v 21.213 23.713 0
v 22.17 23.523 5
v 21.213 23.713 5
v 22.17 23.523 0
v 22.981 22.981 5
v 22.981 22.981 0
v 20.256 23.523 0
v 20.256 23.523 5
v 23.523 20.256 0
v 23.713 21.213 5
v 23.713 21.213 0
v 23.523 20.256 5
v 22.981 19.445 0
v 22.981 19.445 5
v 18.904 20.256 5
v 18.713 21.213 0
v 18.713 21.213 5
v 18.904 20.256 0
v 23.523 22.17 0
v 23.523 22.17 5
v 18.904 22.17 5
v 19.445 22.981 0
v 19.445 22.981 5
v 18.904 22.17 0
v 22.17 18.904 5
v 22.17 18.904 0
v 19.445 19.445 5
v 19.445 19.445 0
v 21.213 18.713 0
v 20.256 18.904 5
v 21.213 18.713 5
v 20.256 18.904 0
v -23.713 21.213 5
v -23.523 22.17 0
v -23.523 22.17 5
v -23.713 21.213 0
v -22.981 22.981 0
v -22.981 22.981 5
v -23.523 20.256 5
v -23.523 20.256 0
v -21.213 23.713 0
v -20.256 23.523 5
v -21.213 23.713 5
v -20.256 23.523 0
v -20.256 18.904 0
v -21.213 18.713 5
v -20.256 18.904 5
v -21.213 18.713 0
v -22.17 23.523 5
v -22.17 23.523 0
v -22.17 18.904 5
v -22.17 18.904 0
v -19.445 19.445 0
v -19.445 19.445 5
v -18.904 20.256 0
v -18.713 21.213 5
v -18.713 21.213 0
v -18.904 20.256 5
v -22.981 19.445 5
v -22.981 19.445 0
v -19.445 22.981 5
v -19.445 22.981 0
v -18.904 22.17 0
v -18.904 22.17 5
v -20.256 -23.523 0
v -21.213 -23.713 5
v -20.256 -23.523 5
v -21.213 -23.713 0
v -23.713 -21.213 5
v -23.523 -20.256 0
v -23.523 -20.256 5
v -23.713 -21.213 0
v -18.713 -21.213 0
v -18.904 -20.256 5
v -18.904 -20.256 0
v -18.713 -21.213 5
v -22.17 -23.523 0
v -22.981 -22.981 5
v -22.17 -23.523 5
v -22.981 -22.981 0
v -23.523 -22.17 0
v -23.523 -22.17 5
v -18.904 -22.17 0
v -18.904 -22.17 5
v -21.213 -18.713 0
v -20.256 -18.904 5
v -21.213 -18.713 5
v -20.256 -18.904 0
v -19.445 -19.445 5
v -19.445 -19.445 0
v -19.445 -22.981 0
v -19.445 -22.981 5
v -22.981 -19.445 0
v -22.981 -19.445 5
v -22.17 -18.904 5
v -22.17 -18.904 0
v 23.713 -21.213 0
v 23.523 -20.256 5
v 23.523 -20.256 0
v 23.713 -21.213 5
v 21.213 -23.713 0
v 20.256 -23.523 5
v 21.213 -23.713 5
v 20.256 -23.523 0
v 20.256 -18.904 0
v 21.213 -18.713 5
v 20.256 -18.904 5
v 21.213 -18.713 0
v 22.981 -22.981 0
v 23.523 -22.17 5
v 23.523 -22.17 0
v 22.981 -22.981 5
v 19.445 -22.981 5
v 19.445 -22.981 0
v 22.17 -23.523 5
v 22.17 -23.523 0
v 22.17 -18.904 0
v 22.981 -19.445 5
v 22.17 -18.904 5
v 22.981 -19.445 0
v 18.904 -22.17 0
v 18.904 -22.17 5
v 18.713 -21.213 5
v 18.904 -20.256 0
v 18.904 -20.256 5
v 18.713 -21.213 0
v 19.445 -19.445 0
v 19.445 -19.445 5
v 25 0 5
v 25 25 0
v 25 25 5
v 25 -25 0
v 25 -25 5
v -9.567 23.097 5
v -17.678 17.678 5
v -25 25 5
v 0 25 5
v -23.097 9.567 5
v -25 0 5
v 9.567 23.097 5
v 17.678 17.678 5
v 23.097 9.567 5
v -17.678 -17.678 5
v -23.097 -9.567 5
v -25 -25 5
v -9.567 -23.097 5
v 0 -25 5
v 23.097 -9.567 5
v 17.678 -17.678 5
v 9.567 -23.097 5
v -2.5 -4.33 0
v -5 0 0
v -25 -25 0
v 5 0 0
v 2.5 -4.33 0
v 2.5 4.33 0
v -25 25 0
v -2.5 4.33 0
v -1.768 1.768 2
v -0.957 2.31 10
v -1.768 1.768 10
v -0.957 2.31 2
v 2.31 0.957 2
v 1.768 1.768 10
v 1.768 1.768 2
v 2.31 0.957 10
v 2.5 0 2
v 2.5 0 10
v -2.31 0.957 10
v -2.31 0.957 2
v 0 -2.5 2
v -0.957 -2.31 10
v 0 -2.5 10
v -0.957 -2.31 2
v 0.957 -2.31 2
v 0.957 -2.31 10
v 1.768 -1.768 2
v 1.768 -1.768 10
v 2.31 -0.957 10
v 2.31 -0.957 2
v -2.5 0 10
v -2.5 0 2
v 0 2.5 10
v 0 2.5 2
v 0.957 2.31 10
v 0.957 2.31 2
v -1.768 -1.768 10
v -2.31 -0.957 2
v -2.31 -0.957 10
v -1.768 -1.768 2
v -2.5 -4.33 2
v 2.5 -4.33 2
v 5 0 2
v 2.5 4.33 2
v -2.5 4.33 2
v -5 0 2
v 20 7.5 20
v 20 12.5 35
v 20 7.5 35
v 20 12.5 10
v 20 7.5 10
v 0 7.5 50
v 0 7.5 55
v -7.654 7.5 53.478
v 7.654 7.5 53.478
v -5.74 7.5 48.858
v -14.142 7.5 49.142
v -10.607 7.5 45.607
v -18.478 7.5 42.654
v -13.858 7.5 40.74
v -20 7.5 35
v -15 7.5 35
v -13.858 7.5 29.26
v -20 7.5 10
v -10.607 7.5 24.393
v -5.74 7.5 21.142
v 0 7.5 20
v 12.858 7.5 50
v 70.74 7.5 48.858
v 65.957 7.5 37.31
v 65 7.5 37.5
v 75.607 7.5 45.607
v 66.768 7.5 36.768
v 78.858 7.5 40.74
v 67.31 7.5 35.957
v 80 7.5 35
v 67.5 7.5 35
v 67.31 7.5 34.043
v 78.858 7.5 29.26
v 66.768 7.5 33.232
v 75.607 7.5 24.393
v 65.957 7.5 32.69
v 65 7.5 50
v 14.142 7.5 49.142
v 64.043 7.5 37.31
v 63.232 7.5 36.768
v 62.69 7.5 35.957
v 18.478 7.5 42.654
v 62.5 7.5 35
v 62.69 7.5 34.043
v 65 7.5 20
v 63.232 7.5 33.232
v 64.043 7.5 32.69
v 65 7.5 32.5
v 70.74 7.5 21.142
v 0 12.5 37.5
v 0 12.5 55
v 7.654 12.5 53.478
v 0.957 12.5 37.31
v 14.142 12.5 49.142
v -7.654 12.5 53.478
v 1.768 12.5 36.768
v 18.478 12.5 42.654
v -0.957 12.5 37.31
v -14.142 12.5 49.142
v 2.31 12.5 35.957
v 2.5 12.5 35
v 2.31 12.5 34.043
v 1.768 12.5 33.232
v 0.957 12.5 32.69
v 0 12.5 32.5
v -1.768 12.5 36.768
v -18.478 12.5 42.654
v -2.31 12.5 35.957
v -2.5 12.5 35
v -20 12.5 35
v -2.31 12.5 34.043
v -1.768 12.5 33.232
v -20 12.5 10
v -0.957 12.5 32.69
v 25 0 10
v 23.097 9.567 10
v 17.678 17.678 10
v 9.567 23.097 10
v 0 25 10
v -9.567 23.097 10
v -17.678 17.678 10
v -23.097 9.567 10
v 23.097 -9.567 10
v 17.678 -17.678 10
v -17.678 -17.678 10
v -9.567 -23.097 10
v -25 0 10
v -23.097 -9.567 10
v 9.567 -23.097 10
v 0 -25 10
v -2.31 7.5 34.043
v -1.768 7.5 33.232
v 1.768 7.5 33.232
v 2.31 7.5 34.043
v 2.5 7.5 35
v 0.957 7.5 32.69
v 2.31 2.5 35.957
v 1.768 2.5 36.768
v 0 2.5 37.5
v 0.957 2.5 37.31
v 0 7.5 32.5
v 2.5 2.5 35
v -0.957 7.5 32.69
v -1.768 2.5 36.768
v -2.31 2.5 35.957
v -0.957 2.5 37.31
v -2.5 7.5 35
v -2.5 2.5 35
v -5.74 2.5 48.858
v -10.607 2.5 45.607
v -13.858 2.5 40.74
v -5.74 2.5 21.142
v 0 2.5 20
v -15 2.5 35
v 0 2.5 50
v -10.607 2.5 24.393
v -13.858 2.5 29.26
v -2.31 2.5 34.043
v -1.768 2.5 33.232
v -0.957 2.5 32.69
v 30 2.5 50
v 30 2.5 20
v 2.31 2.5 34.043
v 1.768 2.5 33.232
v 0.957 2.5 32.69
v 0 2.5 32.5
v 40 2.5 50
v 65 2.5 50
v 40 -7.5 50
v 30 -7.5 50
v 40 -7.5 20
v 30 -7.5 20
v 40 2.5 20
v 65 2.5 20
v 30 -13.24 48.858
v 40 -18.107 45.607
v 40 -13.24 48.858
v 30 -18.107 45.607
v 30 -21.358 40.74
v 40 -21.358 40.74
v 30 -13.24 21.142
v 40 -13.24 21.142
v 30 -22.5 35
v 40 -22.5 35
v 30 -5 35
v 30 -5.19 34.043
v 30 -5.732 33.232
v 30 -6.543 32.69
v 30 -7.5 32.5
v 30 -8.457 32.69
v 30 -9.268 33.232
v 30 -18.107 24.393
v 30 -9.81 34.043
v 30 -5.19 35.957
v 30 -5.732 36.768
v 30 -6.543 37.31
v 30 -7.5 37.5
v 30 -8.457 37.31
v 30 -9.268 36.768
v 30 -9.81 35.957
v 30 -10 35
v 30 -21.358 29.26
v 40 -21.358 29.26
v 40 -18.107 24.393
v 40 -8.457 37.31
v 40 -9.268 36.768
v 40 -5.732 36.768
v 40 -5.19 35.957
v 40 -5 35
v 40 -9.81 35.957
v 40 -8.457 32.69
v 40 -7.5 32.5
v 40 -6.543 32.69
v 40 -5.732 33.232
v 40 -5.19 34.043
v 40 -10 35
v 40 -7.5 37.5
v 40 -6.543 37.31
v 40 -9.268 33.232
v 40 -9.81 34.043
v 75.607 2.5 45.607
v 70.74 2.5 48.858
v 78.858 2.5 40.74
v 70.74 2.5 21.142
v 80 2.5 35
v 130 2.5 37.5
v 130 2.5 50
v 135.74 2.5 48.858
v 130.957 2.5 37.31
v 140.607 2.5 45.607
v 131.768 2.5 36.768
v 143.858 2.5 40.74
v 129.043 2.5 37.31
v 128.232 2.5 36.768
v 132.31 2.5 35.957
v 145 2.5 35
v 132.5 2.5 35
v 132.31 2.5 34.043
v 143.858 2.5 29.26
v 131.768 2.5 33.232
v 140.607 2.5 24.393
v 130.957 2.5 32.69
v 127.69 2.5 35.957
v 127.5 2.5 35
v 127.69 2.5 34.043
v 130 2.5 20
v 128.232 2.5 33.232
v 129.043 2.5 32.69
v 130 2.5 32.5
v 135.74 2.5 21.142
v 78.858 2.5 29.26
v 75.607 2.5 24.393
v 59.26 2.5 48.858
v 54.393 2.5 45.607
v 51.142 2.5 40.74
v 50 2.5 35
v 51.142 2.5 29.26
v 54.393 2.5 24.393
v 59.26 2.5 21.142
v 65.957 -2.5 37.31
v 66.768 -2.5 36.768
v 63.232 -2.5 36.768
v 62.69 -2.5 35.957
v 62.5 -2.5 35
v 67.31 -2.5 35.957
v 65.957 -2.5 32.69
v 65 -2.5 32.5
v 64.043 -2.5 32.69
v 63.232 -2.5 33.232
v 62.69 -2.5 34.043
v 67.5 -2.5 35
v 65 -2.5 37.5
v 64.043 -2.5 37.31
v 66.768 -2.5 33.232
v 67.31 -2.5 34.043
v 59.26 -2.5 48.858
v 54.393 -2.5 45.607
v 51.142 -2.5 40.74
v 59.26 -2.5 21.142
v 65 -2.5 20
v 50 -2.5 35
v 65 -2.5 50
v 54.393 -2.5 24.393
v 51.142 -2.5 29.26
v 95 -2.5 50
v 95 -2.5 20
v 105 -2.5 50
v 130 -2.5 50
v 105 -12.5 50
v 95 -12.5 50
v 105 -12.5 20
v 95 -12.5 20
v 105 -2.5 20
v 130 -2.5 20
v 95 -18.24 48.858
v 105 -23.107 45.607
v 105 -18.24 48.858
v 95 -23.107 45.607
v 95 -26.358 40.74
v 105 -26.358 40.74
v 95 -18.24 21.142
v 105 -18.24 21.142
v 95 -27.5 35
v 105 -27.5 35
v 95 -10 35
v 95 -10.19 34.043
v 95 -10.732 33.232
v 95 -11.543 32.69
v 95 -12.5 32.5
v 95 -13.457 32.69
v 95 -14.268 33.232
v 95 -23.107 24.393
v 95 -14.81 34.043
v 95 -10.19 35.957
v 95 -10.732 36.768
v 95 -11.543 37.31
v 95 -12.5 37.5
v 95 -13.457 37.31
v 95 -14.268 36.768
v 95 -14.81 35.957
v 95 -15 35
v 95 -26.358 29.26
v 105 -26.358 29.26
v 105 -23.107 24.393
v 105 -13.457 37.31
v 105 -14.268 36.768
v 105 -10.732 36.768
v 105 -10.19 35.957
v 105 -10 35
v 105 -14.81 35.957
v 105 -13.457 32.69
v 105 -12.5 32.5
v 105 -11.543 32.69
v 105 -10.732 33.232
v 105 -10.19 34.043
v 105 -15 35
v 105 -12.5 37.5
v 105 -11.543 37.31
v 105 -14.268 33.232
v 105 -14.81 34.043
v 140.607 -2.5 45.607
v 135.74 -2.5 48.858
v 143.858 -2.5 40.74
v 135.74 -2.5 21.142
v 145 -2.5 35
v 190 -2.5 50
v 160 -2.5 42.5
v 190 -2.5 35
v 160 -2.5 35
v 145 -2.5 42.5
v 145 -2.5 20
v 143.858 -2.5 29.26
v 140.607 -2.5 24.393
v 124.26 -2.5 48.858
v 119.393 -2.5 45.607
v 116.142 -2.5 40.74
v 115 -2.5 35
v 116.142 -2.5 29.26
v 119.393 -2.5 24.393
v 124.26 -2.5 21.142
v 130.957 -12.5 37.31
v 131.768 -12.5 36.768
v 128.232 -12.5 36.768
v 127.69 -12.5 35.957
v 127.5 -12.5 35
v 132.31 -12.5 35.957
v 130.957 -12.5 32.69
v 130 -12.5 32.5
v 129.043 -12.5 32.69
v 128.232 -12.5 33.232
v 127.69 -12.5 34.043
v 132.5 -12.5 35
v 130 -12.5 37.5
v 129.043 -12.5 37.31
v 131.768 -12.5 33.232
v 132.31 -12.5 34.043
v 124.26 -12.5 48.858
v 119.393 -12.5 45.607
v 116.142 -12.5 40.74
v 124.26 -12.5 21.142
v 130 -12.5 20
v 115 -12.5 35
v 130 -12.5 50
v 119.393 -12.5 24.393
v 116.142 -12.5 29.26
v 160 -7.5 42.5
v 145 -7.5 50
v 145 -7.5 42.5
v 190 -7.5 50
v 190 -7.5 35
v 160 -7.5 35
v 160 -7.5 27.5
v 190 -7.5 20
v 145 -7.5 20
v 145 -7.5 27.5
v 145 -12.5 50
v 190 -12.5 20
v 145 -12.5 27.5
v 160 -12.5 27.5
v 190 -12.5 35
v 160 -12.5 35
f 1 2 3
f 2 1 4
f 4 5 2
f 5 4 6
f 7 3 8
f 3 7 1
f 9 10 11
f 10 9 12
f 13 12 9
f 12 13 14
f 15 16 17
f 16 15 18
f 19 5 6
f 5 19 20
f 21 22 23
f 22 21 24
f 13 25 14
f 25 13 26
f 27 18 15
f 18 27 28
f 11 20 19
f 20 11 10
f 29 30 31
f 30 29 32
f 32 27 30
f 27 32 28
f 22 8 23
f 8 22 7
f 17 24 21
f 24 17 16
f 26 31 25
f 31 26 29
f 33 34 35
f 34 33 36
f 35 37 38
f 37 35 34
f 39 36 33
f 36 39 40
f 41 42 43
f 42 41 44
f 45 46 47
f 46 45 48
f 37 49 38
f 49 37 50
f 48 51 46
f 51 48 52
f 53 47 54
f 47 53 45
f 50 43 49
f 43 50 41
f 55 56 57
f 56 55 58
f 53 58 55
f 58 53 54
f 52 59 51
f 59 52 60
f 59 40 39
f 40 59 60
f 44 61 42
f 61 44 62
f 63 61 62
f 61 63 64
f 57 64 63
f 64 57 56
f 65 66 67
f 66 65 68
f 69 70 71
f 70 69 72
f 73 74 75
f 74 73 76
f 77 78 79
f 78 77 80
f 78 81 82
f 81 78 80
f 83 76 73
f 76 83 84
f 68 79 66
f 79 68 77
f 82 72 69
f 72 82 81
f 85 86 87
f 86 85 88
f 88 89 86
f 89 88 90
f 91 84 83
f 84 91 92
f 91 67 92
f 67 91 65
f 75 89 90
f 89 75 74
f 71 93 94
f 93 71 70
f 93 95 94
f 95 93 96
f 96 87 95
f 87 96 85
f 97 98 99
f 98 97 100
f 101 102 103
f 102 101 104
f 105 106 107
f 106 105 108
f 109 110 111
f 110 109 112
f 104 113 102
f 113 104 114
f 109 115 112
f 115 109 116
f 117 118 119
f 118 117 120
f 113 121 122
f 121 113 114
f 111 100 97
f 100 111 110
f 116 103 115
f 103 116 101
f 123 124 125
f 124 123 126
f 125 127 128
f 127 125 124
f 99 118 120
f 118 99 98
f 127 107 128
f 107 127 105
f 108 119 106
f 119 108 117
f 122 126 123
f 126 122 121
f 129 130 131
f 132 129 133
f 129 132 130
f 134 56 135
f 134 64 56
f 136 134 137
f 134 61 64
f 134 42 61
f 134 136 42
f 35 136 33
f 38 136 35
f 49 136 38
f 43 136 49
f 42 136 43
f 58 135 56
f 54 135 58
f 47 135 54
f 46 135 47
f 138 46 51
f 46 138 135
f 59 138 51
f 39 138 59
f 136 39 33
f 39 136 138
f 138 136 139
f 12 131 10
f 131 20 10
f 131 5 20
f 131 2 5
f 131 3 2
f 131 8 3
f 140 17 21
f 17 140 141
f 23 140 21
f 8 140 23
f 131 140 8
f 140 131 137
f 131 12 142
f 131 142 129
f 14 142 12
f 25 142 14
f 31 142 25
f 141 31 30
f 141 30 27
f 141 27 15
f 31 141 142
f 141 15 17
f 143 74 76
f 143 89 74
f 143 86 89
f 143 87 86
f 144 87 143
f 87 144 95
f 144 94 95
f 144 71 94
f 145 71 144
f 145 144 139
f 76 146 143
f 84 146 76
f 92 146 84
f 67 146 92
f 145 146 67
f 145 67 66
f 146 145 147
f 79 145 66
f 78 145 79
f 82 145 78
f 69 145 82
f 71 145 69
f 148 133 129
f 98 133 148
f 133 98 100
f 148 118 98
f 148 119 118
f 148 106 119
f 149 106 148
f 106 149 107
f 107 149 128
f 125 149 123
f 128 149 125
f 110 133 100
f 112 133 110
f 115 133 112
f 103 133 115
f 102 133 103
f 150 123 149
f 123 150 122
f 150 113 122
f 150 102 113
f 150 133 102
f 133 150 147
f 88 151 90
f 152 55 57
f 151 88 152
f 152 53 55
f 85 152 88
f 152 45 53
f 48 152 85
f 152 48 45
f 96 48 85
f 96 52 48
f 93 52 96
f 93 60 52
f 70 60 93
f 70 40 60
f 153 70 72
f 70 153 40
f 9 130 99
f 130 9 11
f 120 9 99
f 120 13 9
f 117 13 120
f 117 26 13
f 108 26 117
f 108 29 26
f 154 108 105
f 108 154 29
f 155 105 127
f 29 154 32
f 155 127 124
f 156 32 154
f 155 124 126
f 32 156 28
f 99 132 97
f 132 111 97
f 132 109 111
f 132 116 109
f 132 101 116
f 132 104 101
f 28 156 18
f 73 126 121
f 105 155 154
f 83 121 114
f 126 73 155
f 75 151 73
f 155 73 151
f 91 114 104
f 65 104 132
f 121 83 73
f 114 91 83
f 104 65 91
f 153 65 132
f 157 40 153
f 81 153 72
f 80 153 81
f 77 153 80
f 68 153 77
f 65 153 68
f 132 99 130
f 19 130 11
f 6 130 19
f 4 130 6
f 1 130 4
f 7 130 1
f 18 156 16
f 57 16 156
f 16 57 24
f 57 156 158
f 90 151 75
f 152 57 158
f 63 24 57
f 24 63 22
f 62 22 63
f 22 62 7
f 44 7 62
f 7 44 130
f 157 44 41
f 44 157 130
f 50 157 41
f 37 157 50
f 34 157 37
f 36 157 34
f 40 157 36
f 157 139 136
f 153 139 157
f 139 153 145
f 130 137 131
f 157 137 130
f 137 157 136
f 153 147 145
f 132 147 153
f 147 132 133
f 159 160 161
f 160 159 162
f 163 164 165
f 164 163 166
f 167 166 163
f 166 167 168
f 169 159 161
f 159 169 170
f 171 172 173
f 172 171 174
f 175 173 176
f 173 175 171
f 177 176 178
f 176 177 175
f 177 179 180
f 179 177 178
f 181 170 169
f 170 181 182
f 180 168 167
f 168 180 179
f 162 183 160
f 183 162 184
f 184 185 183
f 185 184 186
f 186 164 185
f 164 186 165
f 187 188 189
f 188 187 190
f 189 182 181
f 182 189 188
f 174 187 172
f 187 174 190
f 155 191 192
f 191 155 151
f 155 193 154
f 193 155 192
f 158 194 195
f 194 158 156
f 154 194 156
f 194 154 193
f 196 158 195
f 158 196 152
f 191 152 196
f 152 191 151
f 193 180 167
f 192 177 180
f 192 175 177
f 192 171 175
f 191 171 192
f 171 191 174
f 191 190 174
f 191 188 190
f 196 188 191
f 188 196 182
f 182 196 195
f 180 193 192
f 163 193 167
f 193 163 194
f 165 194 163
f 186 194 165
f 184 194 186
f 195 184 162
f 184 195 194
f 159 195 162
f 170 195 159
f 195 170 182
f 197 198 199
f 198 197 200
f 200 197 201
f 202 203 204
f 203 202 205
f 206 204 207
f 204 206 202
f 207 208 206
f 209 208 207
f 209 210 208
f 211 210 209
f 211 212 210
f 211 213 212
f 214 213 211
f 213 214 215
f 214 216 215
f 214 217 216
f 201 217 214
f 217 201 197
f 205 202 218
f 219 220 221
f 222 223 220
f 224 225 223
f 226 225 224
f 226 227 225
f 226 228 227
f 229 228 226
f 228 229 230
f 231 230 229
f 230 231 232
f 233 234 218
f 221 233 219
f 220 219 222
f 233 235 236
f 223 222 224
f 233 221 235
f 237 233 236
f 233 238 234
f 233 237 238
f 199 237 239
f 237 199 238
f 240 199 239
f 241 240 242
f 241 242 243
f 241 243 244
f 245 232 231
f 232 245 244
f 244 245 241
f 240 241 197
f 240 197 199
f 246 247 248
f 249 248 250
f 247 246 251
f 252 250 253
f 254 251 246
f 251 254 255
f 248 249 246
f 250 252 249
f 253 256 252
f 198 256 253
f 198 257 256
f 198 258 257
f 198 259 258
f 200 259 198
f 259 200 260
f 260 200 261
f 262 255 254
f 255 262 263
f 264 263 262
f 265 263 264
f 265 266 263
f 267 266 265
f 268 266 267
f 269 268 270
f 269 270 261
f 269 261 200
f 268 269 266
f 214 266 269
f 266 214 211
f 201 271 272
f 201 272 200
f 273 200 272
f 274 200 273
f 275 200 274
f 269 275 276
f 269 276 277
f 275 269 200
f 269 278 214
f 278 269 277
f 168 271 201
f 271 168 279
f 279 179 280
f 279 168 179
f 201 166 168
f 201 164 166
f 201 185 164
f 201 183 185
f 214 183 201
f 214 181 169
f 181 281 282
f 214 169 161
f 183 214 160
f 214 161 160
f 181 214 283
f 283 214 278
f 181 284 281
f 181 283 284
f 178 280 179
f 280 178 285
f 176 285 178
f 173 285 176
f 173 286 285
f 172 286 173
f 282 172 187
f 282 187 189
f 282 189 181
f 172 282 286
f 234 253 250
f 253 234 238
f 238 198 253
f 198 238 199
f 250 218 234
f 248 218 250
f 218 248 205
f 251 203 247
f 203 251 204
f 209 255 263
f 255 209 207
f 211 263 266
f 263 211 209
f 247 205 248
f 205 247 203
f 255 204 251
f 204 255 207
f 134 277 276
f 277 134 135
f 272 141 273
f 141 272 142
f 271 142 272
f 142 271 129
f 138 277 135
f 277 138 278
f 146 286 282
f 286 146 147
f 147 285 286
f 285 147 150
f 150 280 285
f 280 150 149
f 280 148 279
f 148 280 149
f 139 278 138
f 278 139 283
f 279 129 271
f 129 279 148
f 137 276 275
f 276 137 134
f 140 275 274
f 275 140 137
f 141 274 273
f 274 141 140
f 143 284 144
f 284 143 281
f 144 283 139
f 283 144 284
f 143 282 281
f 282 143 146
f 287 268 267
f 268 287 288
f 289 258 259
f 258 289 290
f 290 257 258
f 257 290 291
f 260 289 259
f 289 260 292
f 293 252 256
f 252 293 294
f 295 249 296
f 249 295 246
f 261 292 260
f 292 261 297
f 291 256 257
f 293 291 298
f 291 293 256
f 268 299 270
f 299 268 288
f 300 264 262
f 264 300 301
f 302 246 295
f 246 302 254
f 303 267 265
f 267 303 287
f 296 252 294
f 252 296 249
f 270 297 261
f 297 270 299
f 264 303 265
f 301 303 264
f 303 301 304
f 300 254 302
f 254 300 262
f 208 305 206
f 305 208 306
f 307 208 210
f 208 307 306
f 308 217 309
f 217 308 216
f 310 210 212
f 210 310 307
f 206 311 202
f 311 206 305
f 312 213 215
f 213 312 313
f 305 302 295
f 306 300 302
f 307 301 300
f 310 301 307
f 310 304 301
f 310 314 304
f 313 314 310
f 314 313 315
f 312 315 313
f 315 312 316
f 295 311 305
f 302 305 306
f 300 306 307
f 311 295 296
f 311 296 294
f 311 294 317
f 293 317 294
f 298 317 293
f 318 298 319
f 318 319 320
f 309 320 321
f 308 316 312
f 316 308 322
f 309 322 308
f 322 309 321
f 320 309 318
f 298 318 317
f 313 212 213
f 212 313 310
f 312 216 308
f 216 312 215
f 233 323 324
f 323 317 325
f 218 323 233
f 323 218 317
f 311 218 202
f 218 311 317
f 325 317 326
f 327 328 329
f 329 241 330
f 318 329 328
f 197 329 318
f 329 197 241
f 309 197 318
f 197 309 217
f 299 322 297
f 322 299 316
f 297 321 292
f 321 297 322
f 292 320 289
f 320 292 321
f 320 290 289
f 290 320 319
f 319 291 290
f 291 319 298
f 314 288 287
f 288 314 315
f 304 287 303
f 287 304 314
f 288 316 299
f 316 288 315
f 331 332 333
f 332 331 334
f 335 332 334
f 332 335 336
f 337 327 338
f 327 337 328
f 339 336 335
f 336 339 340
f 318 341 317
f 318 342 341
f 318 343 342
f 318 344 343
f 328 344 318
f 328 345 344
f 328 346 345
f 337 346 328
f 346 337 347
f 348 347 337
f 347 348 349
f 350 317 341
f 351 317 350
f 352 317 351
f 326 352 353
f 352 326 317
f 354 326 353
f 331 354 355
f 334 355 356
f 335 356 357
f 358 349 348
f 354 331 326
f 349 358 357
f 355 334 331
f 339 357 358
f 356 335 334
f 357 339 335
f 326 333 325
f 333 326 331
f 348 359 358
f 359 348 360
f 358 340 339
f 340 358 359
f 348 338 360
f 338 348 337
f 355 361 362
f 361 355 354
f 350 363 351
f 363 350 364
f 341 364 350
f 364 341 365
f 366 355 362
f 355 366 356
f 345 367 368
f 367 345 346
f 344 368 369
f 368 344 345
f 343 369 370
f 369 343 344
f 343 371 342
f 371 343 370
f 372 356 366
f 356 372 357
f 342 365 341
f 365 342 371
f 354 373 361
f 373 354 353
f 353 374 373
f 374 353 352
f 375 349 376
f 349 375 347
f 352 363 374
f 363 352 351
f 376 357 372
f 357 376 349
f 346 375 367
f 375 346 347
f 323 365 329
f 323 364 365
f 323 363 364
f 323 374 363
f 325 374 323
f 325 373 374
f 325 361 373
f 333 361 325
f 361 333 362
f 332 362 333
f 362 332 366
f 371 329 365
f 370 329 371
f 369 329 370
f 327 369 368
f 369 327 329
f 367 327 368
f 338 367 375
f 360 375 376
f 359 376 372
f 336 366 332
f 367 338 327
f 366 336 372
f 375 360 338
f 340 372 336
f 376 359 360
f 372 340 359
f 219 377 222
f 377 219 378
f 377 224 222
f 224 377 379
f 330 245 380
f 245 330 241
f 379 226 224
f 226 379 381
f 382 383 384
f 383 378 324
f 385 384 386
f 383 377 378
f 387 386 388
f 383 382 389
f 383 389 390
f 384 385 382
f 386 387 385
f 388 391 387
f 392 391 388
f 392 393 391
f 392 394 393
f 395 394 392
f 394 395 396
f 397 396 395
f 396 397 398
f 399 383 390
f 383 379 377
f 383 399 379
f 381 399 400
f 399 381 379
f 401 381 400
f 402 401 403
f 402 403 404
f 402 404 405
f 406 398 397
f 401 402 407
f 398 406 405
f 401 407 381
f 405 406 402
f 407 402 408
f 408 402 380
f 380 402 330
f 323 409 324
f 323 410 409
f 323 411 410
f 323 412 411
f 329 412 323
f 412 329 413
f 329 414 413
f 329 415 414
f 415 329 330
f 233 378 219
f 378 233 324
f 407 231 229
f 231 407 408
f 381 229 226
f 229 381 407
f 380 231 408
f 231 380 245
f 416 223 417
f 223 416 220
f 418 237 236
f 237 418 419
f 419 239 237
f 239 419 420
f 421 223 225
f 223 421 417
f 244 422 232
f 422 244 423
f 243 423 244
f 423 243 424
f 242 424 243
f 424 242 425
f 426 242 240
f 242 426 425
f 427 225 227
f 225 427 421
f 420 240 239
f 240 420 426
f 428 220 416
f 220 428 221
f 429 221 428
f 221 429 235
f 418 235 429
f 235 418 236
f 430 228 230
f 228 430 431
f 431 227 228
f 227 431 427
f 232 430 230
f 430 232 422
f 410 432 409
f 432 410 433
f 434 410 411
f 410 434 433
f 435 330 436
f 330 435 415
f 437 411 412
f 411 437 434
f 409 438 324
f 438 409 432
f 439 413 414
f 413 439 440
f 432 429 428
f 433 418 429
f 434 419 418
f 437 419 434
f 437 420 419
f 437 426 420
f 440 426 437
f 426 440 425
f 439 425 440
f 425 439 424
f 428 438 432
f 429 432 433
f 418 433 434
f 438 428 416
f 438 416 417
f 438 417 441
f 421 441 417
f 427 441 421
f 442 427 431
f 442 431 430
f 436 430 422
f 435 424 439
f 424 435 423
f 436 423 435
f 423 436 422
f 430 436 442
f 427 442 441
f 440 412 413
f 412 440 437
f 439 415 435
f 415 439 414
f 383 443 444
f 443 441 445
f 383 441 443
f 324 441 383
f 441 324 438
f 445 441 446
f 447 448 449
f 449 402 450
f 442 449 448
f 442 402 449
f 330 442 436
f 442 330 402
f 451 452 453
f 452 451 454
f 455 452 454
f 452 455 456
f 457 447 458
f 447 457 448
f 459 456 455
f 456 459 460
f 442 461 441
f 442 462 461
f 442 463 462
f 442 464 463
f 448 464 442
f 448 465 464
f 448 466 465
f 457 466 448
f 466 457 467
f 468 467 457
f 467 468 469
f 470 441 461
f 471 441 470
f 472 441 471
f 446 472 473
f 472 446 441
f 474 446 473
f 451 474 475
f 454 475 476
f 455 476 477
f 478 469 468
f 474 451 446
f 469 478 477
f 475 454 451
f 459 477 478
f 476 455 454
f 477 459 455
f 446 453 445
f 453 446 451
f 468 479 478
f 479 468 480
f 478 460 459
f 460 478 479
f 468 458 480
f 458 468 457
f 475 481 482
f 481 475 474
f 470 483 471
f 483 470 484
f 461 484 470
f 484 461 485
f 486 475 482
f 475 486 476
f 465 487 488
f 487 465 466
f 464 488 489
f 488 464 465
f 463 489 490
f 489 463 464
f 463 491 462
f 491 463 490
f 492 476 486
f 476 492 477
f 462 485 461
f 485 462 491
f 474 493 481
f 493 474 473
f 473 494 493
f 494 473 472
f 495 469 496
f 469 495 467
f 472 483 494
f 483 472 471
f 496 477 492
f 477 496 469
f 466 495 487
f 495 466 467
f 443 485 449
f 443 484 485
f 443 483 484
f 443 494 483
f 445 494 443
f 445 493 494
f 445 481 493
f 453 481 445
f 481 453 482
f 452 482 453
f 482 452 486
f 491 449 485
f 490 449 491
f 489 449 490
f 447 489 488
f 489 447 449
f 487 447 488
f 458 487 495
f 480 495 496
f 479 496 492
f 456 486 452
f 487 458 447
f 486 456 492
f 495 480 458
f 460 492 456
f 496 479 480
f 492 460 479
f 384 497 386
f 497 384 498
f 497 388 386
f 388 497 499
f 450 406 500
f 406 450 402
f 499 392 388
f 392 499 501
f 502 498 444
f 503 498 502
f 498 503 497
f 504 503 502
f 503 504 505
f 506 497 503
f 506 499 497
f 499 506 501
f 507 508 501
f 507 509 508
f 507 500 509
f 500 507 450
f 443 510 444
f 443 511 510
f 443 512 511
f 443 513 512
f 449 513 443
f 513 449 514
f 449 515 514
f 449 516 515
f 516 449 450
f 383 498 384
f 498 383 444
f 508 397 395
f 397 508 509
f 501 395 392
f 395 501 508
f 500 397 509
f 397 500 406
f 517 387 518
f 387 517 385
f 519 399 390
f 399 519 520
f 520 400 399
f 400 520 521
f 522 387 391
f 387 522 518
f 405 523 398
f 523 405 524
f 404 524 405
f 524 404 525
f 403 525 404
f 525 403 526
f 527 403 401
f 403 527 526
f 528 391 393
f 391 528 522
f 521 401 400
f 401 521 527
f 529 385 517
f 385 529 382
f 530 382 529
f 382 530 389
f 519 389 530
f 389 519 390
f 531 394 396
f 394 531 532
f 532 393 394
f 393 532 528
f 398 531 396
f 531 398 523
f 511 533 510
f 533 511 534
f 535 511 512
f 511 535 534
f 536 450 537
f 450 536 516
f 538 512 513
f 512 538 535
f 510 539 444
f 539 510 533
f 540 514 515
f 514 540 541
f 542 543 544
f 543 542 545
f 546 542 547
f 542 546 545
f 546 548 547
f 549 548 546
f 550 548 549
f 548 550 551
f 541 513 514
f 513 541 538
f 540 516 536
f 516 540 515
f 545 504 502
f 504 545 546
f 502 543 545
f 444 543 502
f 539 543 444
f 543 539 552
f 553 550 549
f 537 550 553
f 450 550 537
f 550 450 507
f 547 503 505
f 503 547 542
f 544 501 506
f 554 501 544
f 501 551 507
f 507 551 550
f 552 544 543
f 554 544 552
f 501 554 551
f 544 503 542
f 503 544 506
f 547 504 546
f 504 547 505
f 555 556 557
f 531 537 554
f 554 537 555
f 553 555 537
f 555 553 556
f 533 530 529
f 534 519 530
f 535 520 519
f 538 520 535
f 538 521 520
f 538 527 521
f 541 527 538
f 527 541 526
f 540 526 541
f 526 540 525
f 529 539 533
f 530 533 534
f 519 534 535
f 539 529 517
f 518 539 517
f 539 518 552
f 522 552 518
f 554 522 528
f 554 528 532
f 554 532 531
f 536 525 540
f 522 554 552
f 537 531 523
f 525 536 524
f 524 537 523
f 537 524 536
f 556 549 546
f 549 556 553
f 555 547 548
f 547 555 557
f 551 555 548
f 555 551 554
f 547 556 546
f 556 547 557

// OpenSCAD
//6 DOF robot generator

//General parameters
$fn=16;
del=1; //small delta
hole=5; //hole diameter in mm
nut_d=10; //corner to corner nut diameter
nut_h=2; //nut thickness
thick=5; //part thickness

//Base params
base_width=50;
shoulder_yaw=0; //Shoulder left to right rotation. Zero is toward the front

//Shoulder params
riser_offset=-10;
riser_space=5;
riser_diam=40;
arm_pitch=180*$t; //arm up down rotation. Zero is toward the front

//Arm params
arm_width=30;
arm_length=30;
elbow_roll=90*$t;

forearm_pitch=90*$t;
wrist_roll=90*$t;
hand_pitch=90*$t;
finger_pitch=90*$t;


//Creating the robot arm
base(base_width,thick,1);

//Tests
//bracket(20,20,5,20,20,5);
//bracket(30,10,5,20,30,5);
//make_tombstone(30,10,5);
//make_tombstone(20,30,5);
//arm(30,100,1);

//Base
module base(base_w,base_h,child=0){
    difference(){
        translate([-base_w/2,-base_w/2,0]) cube([base_w,base_w,base_h]);{
            make_hole(hole,base_h);
            cylinder(nut_h,nut_d/2,nut_d/2,$fn=6);
            for(phi=[45,135,225,315])
                rotate([0,0,phi])
                translate([base_w/2*1.2,0,0])
                make_hole(hole,base_h);
        }
    }
    if(child){
        translate([0,0,thick]) color("blue")
        rotate([0,0,shoulder_yaw])
        shoulder(base_width,thick,riser_offset,riser_space,riser_diam,1);
    }
}

//Shoulder
module shoulder(base_w,base_h,riser_offset,riser_space,riser_diam,child=0)
{
    difference(){
        union(){
            cylinder(base_h,base_w/2,base_w/2);
            translate([0,0,base_h])
            rotate([90,0,0])
            translate([-riser_diam/2,0,-base_h/2+riser_offset]){
                cube([riser_diam,riser_diam/2+riser_space,base_h]);
                translate([riser_diam/2,riser_diam/2+riser_space,0])
                cylinder(base_h,riser_diam/2,riser_diam/2);
            }
        }
        union(){
            make_hole(hole,base_h);
            translate([0,0,base_h+riser_space+riser_diam/2]){
                rotate([90,0,0])
                make_hole(hole,riser_offset+base_h/2);
                rotate([-90,0,0])
                make_hole(hole,-riser_offset+base_h/2);
            }
        }
    }
    if(child){
        translate([0,-riser_offset-thick/2,thick+riser_space+riser_diam/2])
        rotate([90,0,0])
        rotate([0,0,arm_pitch])
        arm(arm_width,arm_length,1);
    }
}

module arm(width,length,child=0){
    bracket(width,length,thick,width,width/2,thick);
    if(child){
        translate([length+thick,0,width/2])
        rotate([0,90,0])
        rotate([0,0,elbow_roll])
        //cylinder(10,0,5);
        elbow(width,length,1);
    }
}

module elbow(width,length,child=0){
    bracket(width,width/2-thick,thick,width,length,thick);
    if(child){
        translate([width/2-thick,0,length])
        rotate([0,-90,0])
        rotate([0,0,forearm_pitch])
        //cylinder(10,0,5);
        forearm(width,length,1);
    }
}

module forearm(width,length,child=0){
    bracket(width,length,thick,width,width/2,thick);
    if(child){
        translate([length+thick,0,width/2])
        rotate([0,90,0])
        rotate([0,0,wrist_roll])
        //cylinder(10,0,5);
        wrist(width,length,1);
    }
}

module wrist(width,length,child=0){
    bracket(width,width/2-thick,thick,width,length,thick);
    if(child){
        translate([width/2-thick,0,length])
        rotate([0,-90,0]){
            //cylinder(10,0,5);
            rotate([0,0,hand_pitch])
            hand(width,width*2,1);
            translate([0,0,thick*2])
            rotate([180,0,0])
            rotate([0,0,finger_pitch])
            hand(width,width*2,1);
        }
    }
}

module hand(width,length,child=0){
    difference(){
        make_tombstone(width,length,thick);
        union(){
            translate([width/2,-width/2-1,-1])
            cube([width/2,width*0.75+1,thick+2]);
            translate([width-1,-width/2-1,-1])
            cube([width+2,width*0.5+1,thick+2]);
        }
    }
}
module make_hole(w,h){
    translate([0,0,-del])
    cylinder(h+2*del,w/2,w/2);
}

module bracket(base_w,base_l,base_t,riser_w,riser_l,riser_t){
    make_tombstone(base_w,base_l+riser_t,base_t);
    translate([base_l,0,riser_l])
    rotate([0,90,0])
    make_tombstone(riser_w,riser_l,riser_t);
}

module make_tombstone(w,l,t){
    difference(){
        union(){
            cylinder(t,d=w);
            translate([0,-w/2,0])
            cube([l,w,t]);
        }
        union(){
            make_hole(hole,thick);
            translate([l,-w/2-1,-1]) cube([w-l,w+2,t+2]);
        }
    }
}
